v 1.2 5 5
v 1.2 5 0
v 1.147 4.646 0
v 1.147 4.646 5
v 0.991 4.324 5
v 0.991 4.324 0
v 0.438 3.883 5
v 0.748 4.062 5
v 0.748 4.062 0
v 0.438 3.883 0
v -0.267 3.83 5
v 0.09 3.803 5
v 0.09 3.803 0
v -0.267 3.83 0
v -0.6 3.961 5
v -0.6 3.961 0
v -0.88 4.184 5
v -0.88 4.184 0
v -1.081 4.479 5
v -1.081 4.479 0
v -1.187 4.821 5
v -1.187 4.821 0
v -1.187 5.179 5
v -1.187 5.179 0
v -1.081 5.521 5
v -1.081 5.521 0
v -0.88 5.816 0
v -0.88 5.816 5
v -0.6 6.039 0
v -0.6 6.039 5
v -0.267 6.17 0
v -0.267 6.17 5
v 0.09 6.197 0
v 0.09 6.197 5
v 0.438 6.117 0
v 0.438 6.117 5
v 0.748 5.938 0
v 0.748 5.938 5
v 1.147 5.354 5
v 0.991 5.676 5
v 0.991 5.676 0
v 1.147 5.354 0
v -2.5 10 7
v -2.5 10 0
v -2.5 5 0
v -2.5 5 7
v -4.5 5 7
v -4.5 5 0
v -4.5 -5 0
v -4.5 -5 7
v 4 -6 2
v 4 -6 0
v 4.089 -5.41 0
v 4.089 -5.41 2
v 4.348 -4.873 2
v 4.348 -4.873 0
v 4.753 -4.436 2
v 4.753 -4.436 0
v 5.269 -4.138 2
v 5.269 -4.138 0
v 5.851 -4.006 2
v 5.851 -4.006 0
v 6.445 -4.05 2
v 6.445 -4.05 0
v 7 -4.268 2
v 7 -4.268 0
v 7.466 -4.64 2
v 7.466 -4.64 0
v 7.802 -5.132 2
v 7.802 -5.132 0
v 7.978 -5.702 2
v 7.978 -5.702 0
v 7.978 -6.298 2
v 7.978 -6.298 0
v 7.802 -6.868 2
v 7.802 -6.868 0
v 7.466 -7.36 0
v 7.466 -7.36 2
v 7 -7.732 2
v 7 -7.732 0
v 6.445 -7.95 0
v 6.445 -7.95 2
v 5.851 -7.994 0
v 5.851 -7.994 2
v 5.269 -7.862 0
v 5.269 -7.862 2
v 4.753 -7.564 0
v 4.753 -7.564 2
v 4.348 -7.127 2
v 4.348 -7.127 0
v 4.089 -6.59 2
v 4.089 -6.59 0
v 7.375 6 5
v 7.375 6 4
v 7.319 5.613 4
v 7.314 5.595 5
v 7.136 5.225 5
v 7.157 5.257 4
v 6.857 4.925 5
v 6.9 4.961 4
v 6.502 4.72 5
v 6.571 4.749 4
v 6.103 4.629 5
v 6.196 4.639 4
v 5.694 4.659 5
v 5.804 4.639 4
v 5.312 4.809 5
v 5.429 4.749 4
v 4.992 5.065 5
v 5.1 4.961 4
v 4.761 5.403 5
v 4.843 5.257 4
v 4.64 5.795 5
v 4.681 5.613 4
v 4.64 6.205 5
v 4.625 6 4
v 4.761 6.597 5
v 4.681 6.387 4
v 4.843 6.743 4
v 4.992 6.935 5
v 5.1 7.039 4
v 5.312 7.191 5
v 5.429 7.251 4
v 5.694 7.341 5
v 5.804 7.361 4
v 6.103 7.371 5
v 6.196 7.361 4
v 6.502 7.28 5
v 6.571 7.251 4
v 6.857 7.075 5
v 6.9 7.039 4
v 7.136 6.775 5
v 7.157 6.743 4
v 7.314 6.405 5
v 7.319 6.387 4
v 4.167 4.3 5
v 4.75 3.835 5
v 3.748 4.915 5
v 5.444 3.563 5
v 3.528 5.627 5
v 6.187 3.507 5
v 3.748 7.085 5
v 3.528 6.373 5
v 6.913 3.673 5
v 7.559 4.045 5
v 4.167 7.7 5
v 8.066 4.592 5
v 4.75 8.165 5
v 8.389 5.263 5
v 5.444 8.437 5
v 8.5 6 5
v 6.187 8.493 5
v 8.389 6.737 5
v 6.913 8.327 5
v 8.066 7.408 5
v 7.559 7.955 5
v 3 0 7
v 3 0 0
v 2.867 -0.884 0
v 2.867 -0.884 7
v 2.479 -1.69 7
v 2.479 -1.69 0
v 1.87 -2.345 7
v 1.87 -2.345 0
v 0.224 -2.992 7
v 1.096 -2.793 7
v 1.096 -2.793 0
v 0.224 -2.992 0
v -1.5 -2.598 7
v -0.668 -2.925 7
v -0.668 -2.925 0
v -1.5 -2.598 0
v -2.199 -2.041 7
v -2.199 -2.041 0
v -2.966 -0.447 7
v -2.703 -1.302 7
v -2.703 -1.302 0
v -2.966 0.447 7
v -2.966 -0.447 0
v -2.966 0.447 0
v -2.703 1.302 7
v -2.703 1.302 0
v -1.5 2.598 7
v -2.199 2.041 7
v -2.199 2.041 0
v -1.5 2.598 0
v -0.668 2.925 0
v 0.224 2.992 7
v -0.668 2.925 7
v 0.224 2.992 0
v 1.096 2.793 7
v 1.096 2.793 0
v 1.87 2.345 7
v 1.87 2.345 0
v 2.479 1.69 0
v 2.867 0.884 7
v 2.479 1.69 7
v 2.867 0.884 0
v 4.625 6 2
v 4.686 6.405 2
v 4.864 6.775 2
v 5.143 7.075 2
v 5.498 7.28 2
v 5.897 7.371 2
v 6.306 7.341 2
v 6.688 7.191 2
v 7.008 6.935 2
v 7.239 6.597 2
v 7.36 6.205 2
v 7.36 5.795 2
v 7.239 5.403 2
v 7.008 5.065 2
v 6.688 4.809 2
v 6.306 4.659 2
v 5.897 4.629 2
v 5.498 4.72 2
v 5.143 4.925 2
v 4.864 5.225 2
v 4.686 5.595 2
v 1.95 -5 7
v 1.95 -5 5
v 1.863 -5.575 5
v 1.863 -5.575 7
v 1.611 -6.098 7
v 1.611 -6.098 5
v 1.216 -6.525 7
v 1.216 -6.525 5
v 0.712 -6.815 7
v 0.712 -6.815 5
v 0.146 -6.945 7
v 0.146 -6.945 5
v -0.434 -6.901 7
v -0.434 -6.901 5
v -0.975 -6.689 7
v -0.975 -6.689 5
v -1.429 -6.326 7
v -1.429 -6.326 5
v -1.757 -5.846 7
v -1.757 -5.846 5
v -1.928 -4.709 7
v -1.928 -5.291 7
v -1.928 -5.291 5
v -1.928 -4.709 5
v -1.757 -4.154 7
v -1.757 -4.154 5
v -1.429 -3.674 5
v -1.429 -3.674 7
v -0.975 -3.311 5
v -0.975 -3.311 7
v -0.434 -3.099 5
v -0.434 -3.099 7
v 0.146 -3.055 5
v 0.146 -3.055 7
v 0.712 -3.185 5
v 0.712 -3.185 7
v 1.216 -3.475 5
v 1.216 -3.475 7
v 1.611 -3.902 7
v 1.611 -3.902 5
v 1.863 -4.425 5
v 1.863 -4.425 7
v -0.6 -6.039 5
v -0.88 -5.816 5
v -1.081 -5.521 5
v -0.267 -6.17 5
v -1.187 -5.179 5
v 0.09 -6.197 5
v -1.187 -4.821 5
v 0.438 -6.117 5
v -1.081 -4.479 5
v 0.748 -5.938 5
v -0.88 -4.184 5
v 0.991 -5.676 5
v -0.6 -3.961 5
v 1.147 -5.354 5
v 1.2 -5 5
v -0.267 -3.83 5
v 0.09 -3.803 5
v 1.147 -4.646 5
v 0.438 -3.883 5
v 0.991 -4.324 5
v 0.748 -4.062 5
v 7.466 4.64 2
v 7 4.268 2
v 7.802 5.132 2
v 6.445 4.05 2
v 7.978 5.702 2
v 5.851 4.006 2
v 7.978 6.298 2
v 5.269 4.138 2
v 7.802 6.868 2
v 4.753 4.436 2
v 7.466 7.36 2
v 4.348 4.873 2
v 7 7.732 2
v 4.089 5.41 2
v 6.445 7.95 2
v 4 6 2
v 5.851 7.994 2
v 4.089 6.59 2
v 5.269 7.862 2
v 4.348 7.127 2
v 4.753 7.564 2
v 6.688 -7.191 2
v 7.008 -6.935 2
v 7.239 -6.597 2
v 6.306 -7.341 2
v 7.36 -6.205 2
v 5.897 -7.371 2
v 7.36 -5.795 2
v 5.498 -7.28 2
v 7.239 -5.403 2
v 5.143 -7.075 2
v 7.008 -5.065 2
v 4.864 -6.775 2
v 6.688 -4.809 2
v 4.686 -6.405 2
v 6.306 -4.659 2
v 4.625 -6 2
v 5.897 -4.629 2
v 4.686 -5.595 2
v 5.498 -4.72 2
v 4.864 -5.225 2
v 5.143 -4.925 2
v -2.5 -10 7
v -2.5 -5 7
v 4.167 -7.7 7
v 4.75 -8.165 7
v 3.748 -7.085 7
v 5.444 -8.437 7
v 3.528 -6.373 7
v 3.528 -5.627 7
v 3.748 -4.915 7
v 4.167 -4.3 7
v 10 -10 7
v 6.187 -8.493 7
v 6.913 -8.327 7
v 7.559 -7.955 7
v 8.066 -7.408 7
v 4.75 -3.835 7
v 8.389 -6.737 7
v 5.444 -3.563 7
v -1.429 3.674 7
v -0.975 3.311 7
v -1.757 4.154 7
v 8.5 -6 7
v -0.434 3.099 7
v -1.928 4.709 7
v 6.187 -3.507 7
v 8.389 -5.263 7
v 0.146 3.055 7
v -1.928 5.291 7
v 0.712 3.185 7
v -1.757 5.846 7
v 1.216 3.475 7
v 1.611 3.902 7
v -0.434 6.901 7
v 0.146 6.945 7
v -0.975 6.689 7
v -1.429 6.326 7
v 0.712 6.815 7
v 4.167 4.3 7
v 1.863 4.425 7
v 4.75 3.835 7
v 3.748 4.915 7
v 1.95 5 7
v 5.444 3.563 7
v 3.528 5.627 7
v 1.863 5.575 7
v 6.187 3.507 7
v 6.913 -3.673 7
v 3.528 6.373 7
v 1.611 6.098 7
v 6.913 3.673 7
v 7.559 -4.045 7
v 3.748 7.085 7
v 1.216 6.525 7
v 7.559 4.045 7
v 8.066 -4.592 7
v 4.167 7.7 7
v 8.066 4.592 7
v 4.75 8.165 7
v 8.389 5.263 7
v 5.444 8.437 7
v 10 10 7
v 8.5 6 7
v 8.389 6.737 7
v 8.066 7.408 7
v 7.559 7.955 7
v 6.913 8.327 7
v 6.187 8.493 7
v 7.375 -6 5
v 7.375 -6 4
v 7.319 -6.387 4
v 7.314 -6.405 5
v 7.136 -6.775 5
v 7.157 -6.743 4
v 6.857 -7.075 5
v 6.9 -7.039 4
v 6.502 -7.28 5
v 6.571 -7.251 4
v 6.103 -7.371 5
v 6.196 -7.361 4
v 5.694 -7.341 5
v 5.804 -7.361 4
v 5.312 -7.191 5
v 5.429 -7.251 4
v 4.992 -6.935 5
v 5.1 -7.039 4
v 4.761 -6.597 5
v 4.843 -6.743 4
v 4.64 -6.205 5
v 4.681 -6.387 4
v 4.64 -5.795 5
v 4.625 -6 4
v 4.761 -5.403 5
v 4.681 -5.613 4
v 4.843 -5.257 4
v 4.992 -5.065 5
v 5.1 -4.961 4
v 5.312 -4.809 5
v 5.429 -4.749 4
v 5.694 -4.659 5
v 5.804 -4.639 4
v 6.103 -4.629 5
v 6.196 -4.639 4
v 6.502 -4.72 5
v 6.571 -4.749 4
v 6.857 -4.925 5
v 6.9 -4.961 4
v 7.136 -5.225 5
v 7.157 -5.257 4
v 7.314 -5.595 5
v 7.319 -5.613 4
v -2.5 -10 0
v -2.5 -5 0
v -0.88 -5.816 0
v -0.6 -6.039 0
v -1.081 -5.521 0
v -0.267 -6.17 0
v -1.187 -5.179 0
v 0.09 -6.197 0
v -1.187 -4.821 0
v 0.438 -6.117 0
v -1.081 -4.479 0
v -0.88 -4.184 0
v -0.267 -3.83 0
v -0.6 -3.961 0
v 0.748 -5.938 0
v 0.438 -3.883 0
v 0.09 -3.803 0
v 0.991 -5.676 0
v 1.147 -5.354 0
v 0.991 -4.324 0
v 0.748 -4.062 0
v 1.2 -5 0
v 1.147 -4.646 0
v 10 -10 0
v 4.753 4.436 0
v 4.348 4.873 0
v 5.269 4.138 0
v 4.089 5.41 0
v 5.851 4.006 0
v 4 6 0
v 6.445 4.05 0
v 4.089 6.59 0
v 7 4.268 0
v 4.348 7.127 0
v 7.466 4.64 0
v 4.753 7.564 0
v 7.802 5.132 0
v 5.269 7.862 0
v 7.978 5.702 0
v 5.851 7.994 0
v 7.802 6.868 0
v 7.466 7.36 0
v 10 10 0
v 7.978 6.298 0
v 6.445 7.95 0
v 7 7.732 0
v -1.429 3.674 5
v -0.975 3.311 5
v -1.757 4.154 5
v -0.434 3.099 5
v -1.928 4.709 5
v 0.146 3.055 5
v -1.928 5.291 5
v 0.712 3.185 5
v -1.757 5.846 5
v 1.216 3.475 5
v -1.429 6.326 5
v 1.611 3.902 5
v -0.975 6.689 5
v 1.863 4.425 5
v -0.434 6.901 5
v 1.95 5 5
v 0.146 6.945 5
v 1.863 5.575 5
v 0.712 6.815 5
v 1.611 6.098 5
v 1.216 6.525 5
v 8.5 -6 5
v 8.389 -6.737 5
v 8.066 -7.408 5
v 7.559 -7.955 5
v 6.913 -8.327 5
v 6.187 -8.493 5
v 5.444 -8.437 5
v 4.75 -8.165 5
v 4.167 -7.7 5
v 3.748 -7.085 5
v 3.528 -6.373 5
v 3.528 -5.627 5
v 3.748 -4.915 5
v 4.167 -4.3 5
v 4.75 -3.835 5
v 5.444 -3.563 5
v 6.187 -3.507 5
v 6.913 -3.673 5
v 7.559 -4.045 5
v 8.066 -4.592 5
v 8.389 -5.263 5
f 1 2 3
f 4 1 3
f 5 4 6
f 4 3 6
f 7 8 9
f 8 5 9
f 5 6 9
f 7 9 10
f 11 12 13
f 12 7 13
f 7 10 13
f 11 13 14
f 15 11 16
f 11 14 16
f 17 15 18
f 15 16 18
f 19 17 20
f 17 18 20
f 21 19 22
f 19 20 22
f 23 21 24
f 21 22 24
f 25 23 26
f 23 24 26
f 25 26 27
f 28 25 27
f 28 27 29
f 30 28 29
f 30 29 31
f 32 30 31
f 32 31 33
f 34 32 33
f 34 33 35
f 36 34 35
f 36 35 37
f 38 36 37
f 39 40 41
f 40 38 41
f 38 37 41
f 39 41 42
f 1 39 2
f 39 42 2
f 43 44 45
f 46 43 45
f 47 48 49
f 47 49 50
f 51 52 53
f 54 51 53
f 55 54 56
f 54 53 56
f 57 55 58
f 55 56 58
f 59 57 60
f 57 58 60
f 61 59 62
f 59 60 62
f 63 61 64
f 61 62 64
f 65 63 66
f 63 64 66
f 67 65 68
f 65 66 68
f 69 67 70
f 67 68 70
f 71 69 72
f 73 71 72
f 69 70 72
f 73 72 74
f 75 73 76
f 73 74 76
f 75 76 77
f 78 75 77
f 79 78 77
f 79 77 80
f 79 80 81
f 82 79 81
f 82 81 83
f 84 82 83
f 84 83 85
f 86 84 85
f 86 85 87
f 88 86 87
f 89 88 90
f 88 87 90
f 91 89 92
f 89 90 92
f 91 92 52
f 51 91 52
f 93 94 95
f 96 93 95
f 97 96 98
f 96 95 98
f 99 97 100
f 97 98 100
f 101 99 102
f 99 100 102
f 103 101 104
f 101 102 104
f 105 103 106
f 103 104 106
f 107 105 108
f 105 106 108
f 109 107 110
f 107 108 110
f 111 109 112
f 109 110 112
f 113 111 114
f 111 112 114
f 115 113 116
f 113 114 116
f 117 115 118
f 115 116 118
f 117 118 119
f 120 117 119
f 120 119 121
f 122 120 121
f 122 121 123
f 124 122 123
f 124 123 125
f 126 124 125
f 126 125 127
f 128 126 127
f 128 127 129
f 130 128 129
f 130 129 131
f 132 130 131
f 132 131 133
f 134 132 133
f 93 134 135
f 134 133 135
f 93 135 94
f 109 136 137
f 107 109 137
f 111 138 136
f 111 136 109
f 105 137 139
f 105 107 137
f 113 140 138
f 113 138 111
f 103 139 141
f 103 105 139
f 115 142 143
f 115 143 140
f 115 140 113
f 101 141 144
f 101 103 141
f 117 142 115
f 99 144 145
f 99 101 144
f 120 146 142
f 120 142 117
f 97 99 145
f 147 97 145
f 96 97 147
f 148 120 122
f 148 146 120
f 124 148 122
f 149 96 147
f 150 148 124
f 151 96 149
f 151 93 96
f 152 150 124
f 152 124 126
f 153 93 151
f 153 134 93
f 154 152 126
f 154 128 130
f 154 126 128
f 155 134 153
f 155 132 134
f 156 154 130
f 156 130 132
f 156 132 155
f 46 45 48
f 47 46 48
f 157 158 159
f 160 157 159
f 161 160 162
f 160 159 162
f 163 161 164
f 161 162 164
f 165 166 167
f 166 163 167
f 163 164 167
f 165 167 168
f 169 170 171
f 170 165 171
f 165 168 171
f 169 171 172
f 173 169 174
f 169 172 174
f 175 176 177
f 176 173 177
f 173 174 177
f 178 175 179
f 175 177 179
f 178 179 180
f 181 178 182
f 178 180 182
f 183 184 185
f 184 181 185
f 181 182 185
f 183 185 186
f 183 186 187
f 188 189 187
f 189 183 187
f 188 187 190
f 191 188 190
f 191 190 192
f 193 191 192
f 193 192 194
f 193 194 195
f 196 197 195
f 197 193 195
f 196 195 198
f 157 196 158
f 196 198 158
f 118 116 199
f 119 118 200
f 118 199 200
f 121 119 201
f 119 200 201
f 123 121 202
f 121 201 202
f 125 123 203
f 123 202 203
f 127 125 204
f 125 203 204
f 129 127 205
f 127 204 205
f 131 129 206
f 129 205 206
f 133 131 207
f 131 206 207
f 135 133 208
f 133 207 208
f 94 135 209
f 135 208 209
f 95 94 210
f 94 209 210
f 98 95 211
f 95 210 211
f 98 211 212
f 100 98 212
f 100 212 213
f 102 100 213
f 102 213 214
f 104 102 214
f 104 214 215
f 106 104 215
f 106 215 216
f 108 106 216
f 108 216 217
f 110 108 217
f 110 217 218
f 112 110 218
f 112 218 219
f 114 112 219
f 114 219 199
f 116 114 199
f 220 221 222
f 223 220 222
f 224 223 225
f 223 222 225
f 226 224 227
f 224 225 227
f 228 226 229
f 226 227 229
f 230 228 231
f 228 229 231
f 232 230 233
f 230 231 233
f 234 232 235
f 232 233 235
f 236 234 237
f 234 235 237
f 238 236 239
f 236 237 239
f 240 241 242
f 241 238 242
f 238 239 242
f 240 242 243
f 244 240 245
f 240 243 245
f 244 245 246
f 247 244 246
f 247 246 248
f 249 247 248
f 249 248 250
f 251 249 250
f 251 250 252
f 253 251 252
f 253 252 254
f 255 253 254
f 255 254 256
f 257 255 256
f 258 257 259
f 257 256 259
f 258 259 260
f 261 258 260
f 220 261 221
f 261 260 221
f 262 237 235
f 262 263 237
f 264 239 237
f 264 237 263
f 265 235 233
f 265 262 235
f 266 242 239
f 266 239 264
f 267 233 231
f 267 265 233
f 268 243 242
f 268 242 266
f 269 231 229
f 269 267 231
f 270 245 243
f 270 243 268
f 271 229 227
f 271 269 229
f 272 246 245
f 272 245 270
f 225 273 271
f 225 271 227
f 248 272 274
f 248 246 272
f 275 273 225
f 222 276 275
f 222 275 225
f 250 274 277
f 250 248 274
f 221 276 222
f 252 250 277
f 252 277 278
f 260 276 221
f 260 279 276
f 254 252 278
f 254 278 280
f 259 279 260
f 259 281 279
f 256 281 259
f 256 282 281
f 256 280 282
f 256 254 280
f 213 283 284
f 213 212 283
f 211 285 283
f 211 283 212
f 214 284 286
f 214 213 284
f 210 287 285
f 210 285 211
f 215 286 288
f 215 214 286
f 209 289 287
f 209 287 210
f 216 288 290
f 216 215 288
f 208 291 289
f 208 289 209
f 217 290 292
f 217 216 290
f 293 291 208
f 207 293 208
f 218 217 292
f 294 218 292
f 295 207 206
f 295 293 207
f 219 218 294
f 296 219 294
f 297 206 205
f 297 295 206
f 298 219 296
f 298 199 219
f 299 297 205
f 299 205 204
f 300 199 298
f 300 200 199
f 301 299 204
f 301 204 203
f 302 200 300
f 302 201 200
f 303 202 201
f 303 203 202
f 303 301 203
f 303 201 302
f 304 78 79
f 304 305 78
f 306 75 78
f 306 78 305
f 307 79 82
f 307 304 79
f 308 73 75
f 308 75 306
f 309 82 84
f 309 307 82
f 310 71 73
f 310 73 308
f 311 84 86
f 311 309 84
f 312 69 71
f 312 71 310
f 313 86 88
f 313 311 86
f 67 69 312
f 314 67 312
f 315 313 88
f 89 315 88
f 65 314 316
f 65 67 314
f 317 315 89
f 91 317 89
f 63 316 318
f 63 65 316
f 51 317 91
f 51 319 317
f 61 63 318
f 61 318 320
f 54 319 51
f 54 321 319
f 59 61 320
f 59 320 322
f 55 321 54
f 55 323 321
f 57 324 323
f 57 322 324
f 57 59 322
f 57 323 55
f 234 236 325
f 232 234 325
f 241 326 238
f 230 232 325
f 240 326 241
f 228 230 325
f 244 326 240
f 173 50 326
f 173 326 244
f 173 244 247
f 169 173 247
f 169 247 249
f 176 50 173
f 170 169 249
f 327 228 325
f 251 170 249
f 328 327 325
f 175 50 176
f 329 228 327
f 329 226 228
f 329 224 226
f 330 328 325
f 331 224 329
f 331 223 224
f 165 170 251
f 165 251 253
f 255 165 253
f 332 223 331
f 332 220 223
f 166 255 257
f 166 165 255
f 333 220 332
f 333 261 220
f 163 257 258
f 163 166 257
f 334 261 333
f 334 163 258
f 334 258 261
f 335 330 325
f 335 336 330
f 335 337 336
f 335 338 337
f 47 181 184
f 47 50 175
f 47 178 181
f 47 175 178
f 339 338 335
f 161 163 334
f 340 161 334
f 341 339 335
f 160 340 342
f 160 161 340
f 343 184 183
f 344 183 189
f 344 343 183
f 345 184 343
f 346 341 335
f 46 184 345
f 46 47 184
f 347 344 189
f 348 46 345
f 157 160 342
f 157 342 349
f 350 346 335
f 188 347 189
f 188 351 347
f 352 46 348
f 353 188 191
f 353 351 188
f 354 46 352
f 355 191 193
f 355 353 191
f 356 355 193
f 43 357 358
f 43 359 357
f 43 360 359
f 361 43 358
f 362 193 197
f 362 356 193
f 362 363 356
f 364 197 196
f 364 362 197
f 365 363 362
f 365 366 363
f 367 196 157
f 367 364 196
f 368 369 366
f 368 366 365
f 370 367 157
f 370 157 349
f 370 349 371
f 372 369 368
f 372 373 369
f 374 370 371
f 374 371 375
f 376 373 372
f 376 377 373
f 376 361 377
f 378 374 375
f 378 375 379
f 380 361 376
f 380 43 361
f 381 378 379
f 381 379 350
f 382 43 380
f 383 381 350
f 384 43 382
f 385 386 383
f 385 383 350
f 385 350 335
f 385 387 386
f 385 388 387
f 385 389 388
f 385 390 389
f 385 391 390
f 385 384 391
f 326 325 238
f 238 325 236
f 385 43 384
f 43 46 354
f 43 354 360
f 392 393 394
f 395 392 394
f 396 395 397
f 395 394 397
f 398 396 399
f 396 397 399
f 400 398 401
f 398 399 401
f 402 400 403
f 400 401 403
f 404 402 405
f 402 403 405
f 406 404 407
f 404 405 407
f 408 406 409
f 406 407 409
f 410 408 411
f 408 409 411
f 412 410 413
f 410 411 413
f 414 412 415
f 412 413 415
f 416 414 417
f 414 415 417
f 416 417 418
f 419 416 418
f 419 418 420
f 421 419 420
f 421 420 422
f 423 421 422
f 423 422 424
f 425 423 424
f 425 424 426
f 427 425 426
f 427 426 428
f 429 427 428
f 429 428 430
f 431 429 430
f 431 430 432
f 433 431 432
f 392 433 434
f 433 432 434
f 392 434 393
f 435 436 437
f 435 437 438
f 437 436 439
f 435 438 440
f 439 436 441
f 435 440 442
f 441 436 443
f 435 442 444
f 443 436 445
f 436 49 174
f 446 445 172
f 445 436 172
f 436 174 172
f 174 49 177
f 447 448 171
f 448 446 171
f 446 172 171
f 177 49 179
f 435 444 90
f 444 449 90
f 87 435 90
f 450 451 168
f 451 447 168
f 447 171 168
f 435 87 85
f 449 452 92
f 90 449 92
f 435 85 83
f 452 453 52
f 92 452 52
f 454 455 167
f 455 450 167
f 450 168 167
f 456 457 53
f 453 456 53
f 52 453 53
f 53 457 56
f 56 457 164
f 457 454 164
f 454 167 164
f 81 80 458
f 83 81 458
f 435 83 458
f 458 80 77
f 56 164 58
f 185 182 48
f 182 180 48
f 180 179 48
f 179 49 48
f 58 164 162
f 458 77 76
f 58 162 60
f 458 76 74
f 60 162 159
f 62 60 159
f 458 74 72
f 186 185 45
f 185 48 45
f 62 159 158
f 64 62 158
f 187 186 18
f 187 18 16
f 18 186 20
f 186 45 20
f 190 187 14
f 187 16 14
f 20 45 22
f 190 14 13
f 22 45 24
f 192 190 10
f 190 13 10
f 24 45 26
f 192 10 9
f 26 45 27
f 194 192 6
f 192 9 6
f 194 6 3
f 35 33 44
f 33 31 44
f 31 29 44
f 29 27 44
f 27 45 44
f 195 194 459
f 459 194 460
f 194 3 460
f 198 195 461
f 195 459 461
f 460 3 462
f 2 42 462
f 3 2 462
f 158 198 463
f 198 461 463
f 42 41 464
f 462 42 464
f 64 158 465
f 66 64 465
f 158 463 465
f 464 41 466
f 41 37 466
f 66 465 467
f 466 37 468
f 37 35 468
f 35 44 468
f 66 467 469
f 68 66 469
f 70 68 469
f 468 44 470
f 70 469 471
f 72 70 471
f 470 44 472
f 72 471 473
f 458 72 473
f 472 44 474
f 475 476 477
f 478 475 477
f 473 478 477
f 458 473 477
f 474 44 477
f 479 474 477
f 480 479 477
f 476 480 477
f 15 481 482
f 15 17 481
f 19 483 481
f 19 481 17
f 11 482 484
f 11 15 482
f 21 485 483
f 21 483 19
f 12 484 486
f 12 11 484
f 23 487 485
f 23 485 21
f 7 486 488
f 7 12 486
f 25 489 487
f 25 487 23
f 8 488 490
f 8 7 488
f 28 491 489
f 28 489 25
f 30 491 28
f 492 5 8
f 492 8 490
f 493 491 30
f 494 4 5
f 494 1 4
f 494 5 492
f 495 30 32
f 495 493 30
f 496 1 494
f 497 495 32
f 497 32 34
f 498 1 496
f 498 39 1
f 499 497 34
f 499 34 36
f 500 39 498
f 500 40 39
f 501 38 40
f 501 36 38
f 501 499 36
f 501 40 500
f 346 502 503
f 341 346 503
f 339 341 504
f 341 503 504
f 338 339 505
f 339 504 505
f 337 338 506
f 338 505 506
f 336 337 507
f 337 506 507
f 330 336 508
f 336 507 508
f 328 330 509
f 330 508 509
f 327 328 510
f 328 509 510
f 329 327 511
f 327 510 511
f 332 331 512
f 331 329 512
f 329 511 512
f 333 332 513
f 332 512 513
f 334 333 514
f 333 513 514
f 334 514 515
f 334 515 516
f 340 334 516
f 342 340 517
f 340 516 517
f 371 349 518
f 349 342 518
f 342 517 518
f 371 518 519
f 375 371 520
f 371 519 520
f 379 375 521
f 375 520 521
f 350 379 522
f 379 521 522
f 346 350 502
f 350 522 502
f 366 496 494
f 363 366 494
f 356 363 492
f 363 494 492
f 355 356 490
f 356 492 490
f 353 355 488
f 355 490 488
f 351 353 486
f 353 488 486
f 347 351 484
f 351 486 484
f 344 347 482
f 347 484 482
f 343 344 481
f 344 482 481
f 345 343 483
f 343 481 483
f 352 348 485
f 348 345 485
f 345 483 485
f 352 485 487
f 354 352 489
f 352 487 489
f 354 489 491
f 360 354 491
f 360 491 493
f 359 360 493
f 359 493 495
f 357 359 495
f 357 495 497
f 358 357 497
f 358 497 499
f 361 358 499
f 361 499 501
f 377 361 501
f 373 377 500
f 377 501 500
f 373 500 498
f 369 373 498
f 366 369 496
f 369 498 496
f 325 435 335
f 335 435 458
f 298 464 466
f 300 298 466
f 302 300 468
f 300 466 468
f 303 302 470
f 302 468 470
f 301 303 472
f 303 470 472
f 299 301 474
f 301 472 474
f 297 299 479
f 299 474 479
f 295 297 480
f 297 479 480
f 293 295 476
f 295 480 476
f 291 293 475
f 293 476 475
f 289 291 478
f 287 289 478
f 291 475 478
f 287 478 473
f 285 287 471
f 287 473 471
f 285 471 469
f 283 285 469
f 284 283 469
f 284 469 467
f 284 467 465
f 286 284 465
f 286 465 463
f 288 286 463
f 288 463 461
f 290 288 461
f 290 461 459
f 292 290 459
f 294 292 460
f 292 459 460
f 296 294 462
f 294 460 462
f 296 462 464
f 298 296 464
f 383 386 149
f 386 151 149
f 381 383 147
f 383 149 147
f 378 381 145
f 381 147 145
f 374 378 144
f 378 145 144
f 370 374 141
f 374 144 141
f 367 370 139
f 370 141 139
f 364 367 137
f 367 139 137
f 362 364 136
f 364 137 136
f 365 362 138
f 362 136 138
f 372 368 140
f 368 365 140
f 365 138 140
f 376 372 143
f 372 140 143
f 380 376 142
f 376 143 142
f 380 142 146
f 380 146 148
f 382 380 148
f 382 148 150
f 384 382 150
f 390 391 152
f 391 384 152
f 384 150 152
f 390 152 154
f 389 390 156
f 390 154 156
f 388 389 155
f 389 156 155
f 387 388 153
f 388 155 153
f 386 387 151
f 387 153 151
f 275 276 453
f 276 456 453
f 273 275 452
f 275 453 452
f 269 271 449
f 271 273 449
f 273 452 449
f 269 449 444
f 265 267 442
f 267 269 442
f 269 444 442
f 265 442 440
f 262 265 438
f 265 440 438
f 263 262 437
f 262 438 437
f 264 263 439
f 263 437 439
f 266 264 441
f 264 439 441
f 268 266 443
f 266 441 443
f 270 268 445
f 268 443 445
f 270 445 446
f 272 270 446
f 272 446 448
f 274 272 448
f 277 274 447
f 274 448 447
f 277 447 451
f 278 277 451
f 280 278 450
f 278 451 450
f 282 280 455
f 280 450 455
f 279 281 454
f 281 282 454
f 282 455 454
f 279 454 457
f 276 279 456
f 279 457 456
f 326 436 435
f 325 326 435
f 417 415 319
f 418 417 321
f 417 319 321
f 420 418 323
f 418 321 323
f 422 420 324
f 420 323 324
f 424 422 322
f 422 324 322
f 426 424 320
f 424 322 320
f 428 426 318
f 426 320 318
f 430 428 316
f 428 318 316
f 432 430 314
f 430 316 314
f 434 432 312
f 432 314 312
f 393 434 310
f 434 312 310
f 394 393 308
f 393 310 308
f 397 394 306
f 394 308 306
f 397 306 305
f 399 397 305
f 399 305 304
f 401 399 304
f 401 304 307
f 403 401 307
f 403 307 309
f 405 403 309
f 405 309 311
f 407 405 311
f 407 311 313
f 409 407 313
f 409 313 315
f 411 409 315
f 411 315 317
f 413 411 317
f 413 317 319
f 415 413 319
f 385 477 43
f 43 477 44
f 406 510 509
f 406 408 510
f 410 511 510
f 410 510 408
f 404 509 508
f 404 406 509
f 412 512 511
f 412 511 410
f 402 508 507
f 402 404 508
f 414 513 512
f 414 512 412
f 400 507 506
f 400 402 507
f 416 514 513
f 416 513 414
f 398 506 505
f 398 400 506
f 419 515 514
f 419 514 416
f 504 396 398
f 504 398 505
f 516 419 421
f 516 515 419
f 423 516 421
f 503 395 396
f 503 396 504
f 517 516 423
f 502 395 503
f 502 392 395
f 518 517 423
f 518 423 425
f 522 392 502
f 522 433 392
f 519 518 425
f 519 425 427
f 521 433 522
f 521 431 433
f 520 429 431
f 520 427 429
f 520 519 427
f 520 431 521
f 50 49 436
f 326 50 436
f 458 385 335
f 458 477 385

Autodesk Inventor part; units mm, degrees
ref_plane "YZ Plane" through (0, 0, 0) normal (1, 0, 0) x (0, 1, 0)
ref_plane "XZ Plane" through (0, 0, 0) normal (0, 1, 0) x (-1, 0, 0)
ref_plane "XY Plane" through (0, 0, 0) normal (0, 0, 1) x (1, 0, 0)
sketch "Sketch1" plane through (0, 0, 0) normal (0, 0, 1) x (1, 0, 0)
  line L0 (10, -10) -> (-10, -10)
  line L1 (-10, -10) -> (-10, 10)
  line L2 (-10, 10) -> (10, 10)
  line L3 (10, 10) -> (10, -10)
  circle A0 centre (0, 5) radius 1.2
  circle A1 centre (0, -5) radius 1.2
  circle A2 centre (0, 0) radius 3
  dimension "d0" = 10
  dimension "d1" = 10
  dimension "d2" = 10
  dimension "d3" = 10
  dimension "d4" = 5
  dimension "d5" = 5
  dimension "d6" = 2.4
  dimension "d7" = 2.4
  dimension "d8" = 6
extrude "Extrusion1" add sketch "Sketch1" along normal blind 5
sketch "Sketch2" plane through (0, 0, 5) normal (0, 0, 1) x (1, 0, 0)
  line L0 (0, 0) -> (-1.3346, -1.3533)
  circle A0 centre (6, -6) radius 2.5
  circle A1 centre (6, 6) radius 2.5
  line L1 (10, -10) -> (10, 10) projected
  line L2 (-10, -10) -> (10, -10) projected
  line L3 (10, 10) -> (-10, 10) projected
  dimension "d34" = 4
  dimension "d35" = 4
  dimension "d36" = 4
  dimension "d37" = 4
  dimension "d38" = 5
  dimension "d39" = 5
extrude "Extrusion2" cut sketch "Sketch2" against normal blind 1
sketch "Sketch7" plane through (0, 0, 0) normal (0, 0, -1) x (-1, 0, 0)
  circle A0 centre (-6, 6) radius 2.5 projected
  circle A1 centre (-6, 6) radius 1.375
  circle A2 centre (-6, -6) radius 2.5 projected
  circle A3 centre (-6, -6) radius 1.375
  point P0 (0, 0)
  dimension "d40" = 2.75
  dimension "d41" = 2.75
extrude "Extrusion6" cut sketch "Sketch7" against normal blind 5 contours A1 | A3
sketch "Sketch8" plane through (0, 0, 5) normal (0, 0, 1) x (1, 0, 0)
  line L0 (10, 10) -> (-10, 10) projected
  line L1 (10, 10) -> (2.5, 10)
  line L2 (2.5, 10) -> (2.5, 2.5)
  line L3 (2.5, 2.5) -> (10, 2.5)
  line L4 (10, 2.5) -> (10, 10)
  line L5 (10, -10) -> (10, 10) projected
  line L6 (10, -10) -> (2.5, -10)
  line L7 (2.5, -10) -> (2.5, -2.5)
  line L8 (2.5, -2.5) -> (10, -2.5)
  line L9 (10, -2.5) -> (10, -10)
  line L10 (10, -2.5) -> (5, -2.5)
  line L11 (5, -2.5) -> (5, 2.5)
  line L12 (5, 2.5) -> (10, 2.5)
  line L13 (10, 2.5) -> (10, -2.5)
  circle A0 centre (6, 6) radius 2.5 projected
  circle A1 centre (6, 6) radius 2.5
  circle A2 centre (6, -6) radius 2.5 projected
  circle A3 centre (6, -6) radius 2.5
  point P0 (0, 0)
  point P1 (2.5, 10)
  dimension "d44" = 7.5
  dimension "d45" = 7.5
  dimension "d46" = 7.5
  dimension "d47" = 7.5
  dimension "d48" = 5
extrude "Extrusion7" add sketch "Sketch8" along normal blind 2
sketch "Sketch9" plane through (0, 0, 0) normal (0, 0, -1) x (-1, 0, 0)
  circle A0 centre (-6, 6) radius 1.375 projected
  circle A1 centre (-6, 6) radius 2
  circle A2 centre (-6, -6) radius 1.375 projected
  circle A3 centre (-6, -6) radius 2
  point P0 (0, 0)
  dimension "d51" = 4
  dimension "d52" = 4
extrude "Extrusion8" cut sketch "Sketch9" against normal blind 2 contours A0 | A1 | A2 | A3
sketch "Sketch10" plane through (0, 0, 0) normal (0, 0, -1) x (-1, 0, 0)
  line L0 (-2.5, 10) -> (10, 10) projected
  line L1 (10, -10) -> (-2.5, -10) projected
  line L2 (10, 10) -> (5, 10)
  line L3 (5, 10) -> (5, -10)
  line L4 (5, -10) -> (10, -10)
  line L5 (10, -10) -> (10, 10)
  line L6 (5, 10) -> (2.5, 10)
  line L7 (2.5, 10) -> (2.5, 5)
  line L8 (2.5, 5) -> (5, 5)
  line L9 (5, 5) -> (5, 10)
  line L10 (5, -10) -> (2.5, -10)
  line L11 (2.5, -10) -> (2.5, -5)
  line L12 (2.5, -5) -> (5, -5)
  line L13 (5, -5) -> (5, -10)
  point P0 (0, 0)
  point P1 (2.5, 10)
  dimension "d55" = 5
  dimension "d56" = 2.5
  dimension "d57" = 5
  dimension "d58" = 5
  dimension "d59" = 2.5
extrude "Extrusion9" cut sketch "Sketch10" against normal blind 10
sketch "Sketch12" plane through (6, -6, 4) normal (0, 0, 1) x (1, 0, 0)
  circle A0 centre (0, 0) radius 1.375 projected
  circle A1 centre (0, 0) radius 2.5 projected
  circle A2 centre (0, 12) radius 2 projected
  circle A3 centre (0, 12) radius 1.375 projected
  circle A4 centre (0, 12) radius 2.5 projected
  point P0 (-6, 6)
extrude "Extrusion11" add sketch "Sketch12" along normal blind 1 contours A1 | A2 | A4
sketch "Sketch13" plane through (0, 0, 5) normal (0, 0, 1) x (1, 0, 0)
  point P0 (0, 0)
sketch "Sketch14" plane through (0, 0, 5) normal (0, 0, 1) x (1, 0, 0)
  line L0 (-2.5, -5) -> (-2.5, -10) projected
  line L1 (-2.5, -10) -> (2.5, -10) projected
  line L2 (2.5, -10) -> (2.5, -2.5) projected
  line L3 (2.5, -2.5) -> (5, -2.5) projected
  line L4 (5, -2.5) -> (5, 2.5) projected
  line L5 (5, 2.5) -> (2.5, 2.5) projected
  line L6 (2.5, 2.5) -> (2.5, 10) projected
  line L7 (2.5, 10) -> (-2.5, 10) projected
  line L8 (-2.5, 10) -> (-2.5, 5) projected
  line L9 (-2.5, 5) -> (-5, 5) projected
  line L10 (-5, 5) -> (-5, -5) projected
  line L11 (-5, -5) -> (-2.5, -5) projected
  circle A0 centre (0, 0) radius 3 projected
  circle A1 centre (0, -5) radius 1.2 projected
  circle A2 centre (0, 5) radius 1.2 projected
  circle A3 centre (0, -5) radius 1.95
  circle A4 centre (0, 5) radius 1.95
  dimension "d80" = 3.9
  dimension "d81" = 3.9
extrude "Extrusion12" add sketch "Sketch14" along normal blind 2 contours L11 L10 L9 L8 L7 L6 L5 L4 L3 L2 L1 L0
sketch "Sketch15" plane through (-5, -5, 0) normal (-1, 0, 0) x (0, 0, 1)
  line L0 (0, 10) -> (7, 10) projected
  line L1 (0, 0) -> (0, 10) projected
  line L2 (0, 0) -> (7, 0) projected
  line L3 (7, 10) -> (7, 0) projected
  point P0 (0, 5)
extrude "Extrusion13" cut sketch "Sketch15" against normal blind 0.5
equation "\"d1\" = d0"
equation "\"d2\" = d0"
equation "\"d3\" = d2"
equation "\"d5\" = d4"
equation "\"d7\" = d6"
equation "\"d39\" = d38"
equation "\"d45\" = d44"
equation "\"d46\" = d45"
equation "\"d52\" = d51"
equation "\"d81\" = d80"
properties part number "MotorMount"
